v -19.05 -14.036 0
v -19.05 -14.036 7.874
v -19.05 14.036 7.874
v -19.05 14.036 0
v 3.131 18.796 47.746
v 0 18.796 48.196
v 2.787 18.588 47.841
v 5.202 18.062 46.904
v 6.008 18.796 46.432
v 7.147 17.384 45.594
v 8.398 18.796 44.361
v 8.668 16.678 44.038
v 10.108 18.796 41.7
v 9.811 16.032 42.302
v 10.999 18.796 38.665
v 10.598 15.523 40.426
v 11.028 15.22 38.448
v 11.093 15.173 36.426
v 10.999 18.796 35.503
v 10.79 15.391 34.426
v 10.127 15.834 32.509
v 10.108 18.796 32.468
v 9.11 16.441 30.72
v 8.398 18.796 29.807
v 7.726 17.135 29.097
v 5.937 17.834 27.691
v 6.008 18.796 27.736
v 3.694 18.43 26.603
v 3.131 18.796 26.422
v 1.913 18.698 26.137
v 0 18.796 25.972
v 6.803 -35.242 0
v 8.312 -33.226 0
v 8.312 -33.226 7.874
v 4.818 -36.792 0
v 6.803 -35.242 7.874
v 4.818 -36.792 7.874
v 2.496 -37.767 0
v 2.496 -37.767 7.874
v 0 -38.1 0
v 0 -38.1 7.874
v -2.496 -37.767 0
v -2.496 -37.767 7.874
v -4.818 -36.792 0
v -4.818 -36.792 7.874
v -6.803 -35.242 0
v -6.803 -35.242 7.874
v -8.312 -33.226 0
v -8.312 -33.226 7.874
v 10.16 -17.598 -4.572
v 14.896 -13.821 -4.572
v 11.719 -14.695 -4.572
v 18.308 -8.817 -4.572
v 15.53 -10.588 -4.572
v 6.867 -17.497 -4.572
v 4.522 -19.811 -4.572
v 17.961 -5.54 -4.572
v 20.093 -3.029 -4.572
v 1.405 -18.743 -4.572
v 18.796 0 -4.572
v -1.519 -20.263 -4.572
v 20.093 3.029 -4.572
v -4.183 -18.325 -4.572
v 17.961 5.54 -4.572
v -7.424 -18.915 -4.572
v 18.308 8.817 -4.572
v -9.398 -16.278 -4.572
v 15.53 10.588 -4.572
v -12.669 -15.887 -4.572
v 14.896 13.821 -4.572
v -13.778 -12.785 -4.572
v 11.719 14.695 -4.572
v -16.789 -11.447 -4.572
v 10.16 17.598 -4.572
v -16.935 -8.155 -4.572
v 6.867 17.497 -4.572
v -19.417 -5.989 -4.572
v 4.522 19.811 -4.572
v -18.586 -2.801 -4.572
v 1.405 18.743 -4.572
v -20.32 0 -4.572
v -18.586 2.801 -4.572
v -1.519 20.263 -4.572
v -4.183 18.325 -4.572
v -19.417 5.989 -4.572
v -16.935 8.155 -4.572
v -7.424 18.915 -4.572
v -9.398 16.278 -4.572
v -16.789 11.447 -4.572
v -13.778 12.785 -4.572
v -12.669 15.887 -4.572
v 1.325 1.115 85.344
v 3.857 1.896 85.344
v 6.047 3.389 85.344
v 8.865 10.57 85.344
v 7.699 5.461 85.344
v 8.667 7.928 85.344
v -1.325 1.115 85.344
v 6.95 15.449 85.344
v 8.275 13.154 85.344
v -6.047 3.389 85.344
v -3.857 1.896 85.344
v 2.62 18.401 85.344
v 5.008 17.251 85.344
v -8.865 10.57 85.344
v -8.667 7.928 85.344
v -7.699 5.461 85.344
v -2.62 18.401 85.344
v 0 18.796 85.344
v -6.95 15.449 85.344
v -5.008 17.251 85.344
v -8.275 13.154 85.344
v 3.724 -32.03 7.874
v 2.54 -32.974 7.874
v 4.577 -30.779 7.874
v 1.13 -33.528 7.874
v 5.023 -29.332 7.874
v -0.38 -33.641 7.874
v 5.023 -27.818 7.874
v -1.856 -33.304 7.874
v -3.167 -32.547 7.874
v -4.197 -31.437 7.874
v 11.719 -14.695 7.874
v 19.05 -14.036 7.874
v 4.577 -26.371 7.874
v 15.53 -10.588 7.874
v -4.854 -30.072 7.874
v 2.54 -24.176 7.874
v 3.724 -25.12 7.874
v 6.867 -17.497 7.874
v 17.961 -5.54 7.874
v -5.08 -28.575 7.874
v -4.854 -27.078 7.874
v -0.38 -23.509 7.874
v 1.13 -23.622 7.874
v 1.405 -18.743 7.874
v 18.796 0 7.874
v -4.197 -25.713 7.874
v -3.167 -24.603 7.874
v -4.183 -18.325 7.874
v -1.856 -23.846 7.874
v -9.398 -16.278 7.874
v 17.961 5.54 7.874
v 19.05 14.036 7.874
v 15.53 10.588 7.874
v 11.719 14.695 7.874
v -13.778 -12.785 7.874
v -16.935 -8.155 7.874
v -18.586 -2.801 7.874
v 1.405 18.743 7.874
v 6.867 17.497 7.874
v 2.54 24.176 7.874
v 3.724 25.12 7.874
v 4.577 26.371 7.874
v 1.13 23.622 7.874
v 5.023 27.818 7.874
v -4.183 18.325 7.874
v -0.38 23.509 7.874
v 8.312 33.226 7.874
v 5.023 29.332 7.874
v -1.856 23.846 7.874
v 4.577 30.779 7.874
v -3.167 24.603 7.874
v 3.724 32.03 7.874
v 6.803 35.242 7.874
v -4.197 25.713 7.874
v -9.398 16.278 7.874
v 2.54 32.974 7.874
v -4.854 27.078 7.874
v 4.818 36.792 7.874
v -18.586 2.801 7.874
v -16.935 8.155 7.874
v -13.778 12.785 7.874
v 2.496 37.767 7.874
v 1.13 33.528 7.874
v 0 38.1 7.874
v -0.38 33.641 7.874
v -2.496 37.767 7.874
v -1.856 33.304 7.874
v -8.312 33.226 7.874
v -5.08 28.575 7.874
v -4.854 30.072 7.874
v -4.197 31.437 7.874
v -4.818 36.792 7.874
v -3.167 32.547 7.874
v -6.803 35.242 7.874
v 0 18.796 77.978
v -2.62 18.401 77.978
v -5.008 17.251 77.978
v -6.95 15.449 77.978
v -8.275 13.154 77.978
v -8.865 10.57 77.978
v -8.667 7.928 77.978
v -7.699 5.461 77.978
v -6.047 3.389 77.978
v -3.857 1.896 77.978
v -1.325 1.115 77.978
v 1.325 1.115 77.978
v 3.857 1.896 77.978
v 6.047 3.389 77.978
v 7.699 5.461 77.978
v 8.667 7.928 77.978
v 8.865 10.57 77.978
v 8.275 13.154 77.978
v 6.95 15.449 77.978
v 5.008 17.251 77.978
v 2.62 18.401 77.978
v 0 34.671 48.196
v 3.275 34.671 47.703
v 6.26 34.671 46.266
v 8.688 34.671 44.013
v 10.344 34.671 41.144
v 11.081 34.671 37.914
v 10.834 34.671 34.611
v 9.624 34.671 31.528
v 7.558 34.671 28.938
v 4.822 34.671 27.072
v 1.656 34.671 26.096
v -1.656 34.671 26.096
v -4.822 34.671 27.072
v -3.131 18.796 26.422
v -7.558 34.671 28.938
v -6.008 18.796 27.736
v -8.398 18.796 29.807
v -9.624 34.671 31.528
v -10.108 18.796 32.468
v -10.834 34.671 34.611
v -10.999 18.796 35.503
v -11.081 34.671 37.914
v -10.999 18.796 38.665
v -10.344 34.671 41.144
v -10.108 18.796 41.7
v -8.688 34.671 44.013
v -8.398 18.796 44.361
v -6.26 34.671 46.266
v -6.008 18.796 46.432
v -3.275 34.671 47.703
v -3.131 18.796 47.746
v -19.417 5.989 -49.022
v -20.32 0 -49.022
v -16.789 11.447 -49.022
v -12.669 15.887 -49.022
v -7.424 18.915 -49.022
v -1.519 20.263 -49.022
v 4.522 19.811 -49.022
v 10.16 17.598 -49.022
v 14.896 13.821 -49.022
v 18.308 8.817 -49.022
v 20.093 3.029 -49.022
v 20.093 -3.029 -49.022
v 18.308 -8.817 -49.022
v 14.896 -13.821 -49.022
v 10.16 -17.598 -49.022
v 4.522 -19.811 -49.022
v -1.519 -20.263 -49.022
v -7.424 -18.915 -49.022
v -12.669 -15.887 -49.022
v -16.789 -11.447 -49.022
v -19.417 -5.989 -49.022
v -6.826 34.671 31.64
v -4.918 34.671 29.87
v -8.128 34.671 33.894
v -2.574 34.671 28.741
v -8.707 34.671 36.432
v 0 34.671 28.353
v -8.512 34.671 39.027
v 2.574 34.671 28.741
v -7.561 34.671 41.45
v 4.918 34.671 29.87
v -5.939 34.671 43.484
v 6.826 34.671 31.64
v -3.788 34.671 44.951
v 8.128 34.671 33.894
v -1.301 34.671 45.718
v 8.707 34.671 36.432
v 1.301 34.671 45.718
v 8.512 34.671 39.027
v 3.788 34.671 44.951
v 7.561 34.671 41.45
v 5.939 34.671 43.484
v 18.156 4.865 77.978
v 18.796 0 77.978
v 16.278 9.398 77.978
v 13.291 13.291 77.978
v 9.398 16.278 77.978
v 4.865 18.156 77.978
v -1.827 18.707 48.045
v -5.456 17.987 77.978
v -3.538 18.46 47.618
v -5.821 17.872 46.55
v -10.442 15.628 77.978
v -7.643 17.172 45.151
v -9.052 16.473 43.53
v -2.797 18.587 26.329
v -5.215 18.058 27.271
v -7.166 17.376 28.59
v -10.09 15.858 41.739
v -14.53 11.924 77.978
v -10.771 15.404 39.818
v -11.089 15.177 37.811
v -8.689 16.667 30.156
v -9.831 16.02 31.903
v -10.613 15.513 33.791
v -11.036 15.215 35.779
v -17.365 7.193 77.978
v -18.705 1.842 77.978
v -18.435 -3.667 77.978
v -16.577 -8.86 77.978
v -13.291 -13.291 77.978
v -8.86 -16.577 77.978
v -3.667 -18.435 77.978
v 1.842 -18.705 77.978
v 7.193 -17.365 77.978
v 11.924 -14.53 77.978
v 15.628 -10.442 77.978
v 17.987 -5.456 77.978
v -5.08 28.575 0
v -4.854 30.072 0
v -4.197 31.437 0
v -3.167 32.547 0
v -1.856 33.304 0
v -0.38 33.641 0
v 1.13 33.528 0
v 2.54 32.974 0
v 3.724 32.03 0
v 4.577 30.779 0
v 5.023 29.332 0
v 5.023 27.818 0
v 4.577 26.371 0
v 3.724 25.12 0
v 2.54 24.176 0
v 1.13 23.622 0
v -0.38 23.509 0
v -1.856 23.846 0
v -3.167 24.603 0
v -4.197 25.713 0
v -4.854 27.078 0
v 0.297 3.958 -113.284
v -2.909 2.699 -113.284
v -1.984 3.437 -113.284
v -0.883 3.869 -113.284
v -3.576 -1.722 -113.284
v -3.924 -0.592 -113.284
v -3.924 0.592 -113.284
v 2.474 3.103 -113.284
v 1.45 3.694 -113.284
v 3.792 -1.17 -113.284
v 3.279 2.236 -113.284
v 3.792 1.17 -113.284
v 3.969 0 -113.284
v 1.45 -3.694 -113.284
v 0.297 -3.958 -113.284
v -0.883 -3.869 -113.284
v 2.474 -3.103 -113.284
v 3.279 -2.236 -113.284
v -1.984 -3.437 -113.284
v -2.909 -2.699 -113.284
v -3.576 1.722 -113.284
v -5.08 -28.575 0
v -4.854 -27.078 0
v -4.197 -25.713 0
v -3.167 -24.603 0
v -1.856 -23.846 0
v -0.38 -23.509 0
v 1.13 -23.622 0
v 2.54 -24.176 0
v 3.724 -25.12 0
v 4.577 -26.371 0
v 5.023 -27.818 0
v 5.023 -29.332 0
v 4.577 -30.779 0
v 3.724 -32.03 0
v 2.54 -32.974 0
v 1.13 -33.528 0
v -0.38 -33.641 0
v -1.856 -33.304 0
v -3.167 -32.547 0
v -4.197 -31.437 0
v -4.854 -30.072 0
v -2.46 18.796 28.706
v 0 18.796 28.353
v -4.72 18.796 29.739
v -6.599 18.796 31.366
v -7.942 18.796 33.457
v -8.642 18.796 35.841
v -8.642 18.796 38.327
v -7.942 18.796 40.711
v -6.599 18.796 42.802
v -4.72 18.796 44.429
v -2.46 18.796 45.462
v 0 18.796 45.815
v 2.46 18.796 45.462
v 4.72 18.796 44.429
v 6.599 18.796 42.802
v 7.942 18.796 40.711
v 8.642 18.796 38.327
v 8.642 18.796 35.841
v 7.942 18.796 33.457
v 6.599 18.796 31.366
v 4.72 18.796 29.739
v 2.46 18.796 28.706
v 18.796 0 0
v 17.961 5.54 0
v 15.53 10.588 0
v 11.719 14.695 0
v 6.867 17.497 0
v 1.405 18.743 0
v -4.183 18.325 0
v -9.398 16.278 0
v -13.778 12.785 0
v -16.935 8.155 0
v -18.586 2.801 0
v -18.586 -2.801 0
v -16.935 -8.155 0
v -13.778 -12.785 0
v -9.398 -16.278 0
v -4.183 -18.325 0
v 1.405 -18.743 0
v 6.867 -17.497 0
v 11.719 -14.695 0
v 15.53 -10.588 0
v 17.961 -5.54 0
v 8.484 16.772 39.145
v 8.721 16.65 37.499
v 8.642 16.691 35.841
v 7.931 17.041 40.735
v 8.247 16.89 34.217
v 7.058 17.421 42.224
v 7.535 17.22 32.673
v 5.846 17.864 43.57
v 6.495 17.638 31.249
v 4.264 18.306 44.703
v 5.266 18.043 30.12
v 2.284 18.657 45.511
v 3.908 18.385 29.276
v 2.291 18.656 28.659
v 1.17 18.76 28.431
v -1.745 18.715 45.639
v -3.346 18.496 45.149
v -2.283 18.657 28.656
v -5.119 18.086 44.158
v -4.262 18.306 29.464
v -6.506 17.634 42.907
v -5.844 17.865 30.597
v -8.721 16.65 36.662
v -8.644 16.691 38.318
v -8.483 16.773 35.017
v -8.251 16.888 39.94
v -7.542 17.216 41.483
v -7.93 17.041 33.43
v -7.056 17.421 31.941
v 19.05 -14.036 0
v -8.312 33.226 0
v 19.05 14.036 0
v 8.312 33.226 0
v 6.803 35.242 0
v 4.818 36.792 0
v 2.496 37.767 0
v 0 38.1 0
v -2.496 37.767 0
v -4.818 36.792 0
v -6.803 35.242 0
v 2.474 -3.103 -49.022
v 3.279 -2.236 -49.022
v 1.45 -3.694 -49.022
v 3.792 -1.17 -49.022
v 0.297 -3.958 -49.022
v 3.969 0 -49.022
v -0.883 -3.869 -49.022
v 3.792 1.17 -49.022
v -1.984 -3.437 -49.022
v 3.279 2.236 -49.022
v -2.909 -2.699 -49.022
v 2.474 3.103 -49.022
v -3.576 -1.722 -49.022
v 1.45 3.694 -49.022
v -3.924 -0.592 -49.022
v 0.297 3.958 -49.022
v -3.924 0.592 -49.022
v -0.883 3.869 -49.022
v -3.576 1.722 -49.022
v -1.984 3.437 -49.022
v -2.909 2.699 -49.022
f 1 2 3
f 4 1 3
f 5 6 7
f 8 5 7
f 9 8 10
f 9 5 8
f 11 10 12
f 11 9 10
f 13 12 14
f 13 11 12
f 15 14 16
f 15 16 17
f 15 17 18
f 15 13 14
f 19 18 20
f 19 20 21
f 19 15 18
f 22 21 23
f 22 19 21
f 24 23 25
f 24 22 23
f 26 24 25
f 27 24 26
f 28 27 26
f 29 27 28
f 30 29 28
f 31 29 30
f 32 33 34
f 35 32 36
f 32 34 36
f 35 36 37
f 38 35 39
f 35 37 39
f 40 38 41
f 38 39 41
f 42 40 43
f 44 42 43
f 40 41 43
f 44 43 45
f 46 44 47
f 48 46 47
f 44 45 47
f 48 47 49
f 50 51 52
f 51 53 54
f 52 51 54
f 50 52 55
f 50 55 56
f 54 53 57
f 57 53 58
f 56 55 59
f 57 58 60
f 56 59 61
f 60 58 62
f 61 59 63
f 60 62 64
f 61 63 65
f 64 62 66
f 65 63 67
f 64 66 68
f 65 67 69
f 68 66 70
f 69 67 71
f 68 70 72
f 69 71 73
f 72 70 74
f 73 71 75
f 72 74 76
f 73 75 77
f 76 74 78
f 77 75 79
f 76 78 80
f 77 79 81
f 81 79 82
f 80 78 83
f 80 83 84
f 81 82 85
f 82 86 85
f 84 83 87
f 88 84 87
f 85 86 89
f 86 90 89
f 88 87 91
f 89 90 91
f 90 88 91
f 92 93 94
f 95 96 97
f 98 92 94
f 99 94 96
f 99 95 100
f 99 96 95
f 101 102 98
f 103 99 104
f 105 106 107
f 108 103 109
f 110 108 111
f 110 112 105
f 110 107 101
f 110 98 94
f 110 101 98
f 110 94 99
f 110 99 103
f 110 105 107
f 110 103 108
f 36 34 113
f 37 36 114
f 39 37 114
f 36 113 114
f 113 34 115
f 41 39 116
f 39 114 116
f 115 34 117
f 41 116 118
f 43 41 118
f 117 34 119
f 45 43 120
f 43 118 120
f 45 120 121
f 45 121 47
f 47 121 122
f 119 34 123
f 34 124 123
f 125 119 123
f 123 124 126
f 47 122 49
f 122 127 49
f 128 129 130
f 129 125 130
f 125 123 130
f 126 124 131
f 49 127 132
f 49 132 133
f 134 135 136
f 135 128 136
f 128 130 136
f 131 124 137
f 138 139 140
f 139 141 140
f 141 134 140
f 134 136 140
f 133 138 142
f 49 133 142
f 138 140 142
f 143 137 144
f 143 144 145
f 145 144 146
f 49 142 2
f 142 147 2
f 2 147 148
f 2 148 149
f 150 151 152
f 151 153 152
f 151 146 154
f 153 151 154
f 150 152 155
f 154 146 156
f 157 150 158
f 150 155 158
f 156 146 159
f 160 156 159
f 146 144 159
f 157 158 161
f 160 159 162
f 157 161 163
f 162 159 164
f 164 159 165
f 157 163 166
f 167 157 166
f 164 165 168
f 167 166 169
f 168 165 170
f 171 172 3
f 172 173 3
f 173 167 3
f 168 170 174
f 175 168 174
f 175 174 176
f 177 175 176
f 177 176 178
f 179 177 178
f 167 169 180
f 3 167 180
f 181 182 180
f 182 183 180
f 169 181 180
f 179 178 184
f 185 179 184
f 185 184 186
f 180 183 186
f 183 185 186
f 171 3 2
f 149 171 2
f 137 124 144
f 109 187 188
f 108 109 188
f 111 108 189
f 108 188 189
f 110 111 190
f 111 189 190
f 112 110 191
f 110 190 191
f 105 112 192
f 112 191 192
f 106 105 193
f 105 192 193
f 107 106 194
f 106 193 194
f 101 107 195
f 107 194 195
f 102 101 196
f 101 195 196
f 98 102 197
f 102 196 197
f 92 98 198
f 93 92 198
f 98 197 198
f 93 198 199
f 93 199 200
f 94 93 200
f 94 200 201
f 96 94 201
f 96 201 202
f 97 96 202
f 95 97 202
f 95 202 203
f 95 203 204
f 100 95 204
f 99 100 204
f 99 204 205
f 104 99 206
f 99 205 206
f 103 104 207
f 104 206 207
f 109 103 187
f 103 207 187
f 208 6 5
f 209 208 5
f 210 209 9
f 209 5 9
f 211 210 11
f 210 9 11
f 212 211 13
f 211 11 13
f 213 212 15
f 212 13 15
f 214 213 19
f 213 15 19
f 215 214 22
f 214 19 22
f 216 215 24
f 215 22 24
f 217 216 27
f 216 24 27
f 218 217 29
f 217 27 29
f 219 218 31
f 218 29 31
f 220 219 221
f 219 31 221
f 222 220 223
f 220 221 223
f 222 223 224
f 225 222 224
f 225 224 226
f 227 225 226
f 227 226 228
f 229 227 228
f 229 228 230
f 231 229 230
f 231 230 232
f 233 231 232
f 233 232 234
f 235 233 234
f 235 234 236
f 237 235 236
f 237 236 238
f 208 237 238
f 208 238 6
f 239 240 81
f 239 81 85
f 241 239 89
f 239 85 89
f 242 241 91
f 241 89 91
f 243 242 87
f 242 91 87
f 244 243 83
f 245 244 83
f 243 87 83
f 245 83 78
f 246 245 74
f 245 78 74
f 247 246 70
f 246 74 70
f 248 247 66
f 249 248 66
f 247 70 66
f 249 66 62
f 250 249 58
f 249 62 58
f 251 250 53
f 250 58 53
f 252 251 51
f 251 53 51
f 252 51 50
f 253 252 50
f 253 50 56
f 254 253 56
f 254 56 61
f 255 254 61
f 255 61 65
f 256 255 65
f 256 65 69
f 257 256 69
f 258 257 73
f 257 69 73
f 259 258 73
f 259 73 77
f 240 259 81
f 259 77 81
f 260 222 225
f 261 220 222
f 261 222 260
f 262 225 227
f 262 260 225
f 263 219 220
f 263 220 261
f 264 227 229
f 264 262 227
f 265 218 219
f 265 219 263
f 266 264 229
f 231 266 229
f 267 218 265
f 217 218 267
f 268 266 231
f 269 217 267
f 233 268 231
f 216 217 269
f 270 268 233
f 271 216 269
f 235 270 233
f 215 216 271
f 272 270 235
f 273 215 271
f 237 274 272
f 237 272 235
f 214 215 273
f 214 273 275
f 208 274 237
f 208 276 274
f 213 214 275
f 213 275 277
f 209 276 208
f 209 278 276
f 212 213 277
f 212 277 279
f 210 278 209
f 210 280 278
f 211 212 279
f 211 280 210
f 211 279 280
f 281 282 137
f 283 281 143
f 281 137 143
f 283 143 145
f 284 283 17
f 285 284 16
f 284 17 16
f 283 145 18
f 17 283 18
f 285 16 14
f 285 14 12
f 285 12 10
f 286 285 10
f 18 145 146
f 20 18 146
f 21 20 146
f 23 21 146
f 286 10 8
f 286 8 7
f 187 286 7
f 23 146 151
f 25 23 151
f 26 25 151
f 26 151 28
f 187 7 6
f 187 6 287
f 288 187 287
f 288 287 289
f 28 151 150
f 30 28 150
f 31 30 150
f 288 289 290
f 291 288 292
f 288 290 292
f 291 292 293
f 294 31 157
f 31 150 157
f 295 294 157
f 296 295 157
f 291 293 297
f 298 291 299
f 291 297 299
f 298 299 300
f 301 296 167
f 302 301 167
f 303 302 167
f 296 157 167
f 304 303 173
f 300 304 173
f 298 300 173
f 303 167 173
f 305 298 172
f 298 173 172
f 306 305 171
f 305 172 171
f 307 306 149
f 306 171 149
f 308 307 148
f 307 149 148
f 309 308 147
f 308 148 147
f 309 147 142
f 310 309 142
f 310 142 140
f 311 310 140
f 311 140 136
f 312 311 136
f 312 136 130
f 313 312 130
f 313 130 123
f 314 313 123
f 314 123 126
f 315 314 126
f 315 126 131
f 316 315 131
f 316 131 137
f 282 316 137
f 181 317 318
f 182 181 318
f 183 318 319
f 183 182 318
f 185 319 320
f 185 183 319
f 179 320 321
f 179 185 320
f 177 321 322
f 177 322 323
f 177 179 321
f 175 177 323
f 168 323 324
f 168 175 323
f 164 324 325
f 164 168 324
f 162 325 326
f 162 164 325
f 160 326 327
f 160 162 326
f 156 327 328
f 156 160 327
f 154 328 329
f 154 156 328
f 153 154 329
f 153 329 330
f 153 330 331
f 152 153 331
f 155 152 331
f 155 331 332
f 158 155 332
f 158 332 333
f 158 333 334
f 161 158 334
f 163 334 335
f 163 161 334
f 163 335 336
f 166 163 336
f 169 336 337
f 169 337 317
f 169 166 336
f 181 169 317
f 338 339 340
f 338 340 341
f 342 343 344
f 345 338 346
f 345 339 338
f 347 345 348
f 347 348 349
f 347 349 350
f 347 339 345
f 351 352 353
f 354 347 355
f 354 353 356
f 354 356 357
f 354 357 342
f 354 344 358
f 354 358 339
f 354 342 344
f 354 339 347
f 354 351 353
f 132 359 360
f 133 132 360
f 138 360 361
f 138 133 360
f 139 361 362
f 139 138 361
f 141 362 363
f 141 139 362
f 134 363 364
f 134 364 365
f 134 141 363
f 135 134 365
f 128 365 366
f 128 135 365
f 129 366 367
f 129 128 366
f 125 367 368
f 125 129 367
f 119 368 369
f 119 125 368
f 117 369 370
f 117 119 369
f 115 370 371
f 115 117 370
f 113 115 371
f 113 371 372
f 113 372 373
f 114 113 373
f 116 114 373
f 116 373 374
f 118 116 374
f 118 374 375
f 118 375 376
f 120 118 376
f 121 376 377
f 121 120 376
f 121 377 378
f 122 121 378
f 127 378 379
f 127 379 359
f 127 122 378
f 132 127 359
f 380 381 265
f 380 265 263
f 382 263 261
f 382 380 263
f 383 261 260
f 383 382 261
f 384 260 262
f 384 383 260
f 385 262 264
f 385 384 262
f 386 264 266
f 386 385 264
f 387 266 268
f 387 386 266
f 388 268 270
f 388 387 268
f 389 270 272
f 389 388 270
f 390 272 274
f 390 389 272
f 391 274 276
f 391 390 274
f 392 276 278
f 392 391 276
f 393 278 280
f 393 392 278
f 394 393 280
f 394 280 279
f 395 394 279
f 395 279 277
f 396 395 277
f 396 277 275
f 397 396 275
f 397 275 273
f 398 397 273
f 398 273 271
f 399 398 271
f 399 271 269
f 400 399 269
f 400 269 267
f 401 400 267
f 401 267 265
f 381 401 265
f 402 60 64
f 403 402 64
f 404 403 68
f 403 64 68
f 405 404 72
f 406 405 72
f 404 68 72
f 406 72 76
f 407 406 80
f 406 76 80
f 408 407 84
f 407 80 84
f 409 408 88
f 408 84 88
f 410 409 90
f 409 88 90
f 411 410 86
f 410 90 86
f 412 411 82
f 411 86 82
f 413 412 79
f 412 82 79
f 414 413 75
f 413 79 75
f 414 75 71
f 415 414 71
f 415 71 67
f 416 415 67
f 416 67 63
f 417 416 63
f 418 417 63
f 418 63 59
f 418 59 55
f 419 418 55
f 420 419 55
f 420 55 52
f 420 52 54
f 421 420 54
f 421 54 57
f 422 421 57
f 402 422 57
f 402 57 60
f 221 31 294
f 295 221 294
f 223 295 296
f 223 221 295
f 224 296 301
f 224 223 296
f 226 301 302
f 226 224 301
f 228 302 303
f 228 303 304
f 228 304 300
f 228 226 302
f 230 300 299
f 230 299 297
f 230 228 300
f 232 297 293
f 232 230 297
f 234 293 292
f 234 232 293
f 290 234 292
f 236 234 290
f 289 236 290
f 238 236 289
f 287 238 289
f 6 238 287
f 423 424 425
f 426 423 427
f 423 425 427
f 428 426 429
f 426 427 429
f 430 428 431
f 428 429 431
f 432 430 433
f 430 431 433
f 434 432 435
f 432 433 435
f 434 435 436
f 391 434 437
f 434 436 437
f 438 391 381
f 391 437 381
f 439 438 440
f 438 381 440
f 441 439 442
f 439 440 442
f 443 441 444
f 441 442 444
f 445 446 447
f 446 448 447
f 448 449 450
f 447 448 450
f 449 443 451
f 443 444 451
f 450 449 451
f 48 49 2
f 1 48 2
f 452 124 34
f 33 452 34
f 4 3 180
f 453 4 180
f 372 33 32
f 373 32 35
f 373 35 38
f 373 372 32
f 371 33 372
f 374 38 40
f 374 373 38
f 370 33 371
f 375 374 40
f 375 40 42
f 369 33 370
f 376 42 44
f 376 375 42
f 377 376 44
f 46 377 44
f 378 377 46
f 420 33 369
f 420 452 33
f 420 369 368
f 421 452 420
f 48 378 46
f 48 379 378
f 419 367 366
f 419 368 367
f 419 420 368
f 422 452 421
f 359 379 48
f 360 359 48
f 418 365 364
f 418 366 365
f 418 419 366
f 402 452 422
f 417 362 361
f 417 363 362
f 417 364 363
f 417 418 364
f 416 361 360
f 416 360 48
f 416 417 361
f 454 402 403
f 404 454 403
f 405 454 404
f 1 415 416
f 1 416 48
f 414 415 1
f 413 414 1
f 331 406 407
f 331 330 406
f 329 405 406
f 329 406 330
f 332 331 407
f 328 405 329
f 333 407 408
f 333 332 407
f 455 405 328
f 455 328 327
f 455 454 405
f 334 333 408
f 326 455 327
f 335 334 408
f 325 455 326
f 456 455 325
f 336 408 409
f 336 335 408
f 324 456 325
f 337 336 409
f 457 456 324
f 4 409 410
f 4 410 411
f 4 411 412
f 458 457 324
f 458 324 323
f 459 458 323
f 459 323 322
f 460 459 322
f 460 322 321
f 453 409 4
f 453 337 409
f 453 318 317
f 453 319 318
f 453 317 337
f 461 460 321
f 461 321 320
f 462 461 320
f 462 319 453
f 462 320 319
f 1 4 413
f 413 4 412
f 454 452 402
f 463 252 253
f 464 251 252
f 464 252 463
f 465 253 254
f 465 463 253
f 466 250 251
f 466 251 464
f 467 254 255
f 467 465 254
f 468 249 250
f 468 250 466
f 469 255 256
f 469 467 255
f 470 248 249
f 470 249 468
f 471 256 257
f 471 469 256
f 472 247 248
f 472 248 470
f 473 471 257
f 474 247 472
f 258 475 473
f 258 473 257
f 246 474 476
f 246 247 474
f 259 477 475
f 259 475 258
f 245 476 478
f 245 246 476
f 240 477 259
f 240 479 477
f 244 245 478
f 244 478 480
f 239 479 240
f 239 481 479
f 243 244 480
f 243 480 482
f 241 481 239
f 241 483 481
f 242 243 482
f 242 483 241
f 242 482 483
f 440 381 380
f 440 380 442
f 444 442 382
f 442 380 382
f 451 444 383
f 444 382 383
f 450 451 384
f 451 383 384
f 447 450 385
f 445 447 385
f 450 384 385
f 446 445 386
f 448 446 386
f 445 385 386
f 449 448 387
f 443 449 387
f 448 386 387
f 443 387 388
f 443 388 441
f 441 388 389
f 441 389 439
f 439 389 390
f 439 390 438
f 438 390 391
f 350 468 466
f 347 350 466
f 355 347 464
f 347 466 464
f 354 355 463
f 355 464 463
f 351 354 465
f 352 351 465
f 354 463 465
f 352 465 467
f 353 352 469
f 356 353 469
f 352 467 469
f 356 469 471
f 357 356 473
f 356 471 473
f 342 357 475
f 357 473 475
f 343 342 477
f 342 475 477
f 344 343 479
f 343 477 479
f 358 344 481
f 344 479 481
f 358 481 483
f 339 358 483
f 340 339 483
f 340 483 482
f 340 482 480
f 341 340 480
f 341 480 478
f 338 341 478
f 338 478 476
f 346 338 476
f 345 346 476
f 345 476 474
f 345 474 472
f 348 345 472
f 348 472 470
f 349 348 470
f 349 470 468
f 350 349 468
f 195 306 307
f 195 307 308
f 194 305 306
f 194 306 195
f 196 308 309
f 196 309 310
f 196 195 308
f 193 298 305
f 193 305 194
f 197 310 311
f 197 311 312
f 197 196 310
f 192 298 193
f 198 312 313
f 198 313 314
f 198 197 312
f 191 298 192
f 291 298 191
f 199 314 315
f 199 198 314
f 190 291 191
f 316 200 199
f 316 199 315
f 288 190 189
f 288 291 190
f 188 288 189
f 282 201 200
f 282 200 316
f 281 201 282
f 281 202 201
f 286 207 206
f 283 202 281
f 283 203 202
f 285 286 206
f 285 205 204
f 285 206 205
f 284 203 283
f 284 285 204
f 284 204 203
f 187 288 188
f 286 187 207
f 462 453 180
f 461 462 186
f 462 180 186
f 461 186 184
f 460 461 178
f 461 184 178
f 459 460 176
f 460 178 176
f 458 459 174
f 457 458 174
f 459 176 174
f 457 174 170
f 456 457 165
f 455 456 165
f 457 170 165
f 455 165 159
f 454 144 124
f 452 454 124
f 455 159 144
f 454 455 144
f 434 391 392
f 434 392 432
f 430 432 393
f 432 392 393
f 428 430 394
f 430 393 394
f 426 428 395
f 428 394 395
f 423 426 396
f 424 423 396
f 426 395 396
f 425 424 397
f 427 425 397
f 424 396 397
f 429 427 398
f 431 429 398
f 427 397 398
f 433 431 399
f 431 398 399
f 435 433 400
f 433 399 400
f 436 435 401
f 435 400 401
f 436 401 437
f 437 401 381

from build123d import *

# Parameters (mm, degrees)
MASTER_CYLINDER_BODY_DEPTH             = 77.978
MASTER_CYLINDER_BODY_DEPTH_BACK        = 4.572
SKETCH1_R                              = 18.796
MASTER_START                           = -7.874
MASTER_CYLINDER_MOUNTS_OUTLINE_R       = 5.08
MASTER_CYLINDER_MOUNTS_OUTLINE_R_2     = 18.796
MASTER_CYLINDER_MOUNTS_DEPTH           = 7.874
SKETCH3_R                              = 11.1125
SKETCH3_R_2                            = 8.73125
RESERVOIR_MOUNT_DEPTH                  = 15.875
RESERVOIR_MOUNT_DIRECTION_2_REACH      = 100.39
RESERVOIR_MOUNT_DIRECTION_2_END_RADIUS = 18.796
SKETCH5_R                              = 8.89
MASTER_CYLINDER_OUTLET_DEPTH           = 7.366
SKETCH6_R                              = 3.96875
PUSHROD_DEPTH                          = 108.712
SKETCH7_R                              = 20.32
RUBBER_COVER_DEPTH                     = 44.45


# Read off the part's stored shape, not the designer's step: Master Cylinder Mounts
with BuildPart() as part:
    # Sketch1 → Master Cylinder Body (new, two sides: drawn at the far end of the back side and taken through both)
    with BuildSketch(Plane.XY.offset(-MASTER_CYLINDER_BODY_DEPTH_BACK)):
        Circle(SKETCH1_R)
    extrude(amount=MASTER_CYLINDER_BODY_DEPTH + MASTER_CYLINDER_BODY_DEPTH_BACK)

    # Master Cylinder Mounts outline → Master Cylinder Mounts (add)
    with BuildSketch(Plane(origin=(0, 0, 0), x_dir=(-1, 0, 0), z_dir=(0, 0, -1)).offset(MASTER_START)):
        with BuildLine():
            ThreePointArc((-8.312226974, -33.226075976), (0, -38.1), (8.312226974, -33.226075976))
            Line((8.312226974, -33.226075976), (19.05, -14.035934373))
            Line((19.05, -14.035934373), (19.05, 14.035934373))
            Line((19.05, 14.035934373), (8.312226974, 33.226075976))
            ThreePointArc((8.312226974, 33.226075976), (0, 38.1), (-8.312226974, 33.226075976))
            Line((-8.312226974, 33.226075976), (-19.05, 14.035934373))
            Line((-19.05, 14.035934373), (-19.05, -14.035934373))
            Line((-19.05, -14.035934373), (-8.312226974, -33.226075976))
        make_face()
        with Locations((0, -28.575)):
            Circle(MASTER_CYLINDER_MOUNTS_OUTLINE_R, mode=Mode.SUBTRACT)
        Circle(MASTER_CYLINDER_MOUNTS_OUTLINE_R_2, mode=Mode.SUBTRACT)
        with Locations((0, 28.575)):
            Circle(MASTER_CYLINDER_MOUNTS_OUTLINE_R, mode=Mode.SUBTRACT)
    extrude(amount=MASTER_CYLINDER_MOUNTS_DEPTH)

    # Sketch3 → Reservoir Mount (add)
    with BuildSketch(Plane(origin=(0, 18.796, 0), x_dir=(1, 0, 0), z_dir=(0, 1, 0))):
        with Locations(Location((0, -37.084, 0), (0, 0, 270))):
            Circle(SKETCH3_R)
        with Locations(Location((0, -37.084, 0), (0, 0, 90))):
            Circle(SKETCH3_R_2, mode=Mode.SUBTRACT)
    extrude(amount=RESERVOIR_MOUNT_DEPTH)

    # Reservoir Mount direction 2: up to this cylinder (the profile starts outside it)
    reservoir_mount_direction_2_end = Plane(origin=(0, 0, 26.285809), z_dir=(0, 0, 1)) * Cylinder(RESERVOIR_MOUNT_DIRECTION_2_END_RADIUS, 239.372, mode=Mode.PRIVATE)
    # Sketch3 → Reservoir Mount direction 2 (add, up to the surface)
    with BuildSketch(Plane(origin=(0, 18.796, 0), x_dir=(1, 0, 0), z_dir=(0, 1, 0)), mode=Mode.PRIVATE) as reservoir_mount_direction_2_sk1:
        with Locations(Location((0, -37.084, 0), (0, 0, 270))):
            Circle(SKETCH3_R)
        with Locations(Location((0, -37.084, 0), (0, 0, 90))):
            Circle(SKETCH3_R_2, mode=Mode.SUBTRACT)
    reservoir_mount_direction_2_tool1 = extrude(reservoir_mount_direction_2_sk1.sketch, amount=-RESERVOIR_MOUNT_DIRECTION_2_REACH, mode=Mode.PRIVATE) - reservoir_mount_direction_2_end
    add(reservoir_mount_direction_2_tool1.solids().sort_by_distance((0, 18.796, 26.285809))[0])
    add(reservoir_mount_direction_2_tool1.solids().sort_by_distance((0, 18.796, 26.285809))[1])

    # Sketch5 → Master Cylinder Outlet (add)
    with BuildSketch(Plane.XY.offset(77.978)):
        with Locations(Location((0, 9.906, 0), (0, 0, 90))):
            Circle(SKETCH5_R)
    extrude(amount=MASTER_CYLINDER_OUTLET_DEPTH)

    # Sketch6 → Pushrod (add)
    with BuildSketch(Plane(origin=(0, 0, -4.572), x_dir=(-1, 0, 0), z_dir=(0, 0, -1))):
        with Locations(Location((0, 0, 0), (0, 0, 180))):
            Circle(SKETCH6_R)
    extrude(amount=PUSHROD_DEPTH)

    # Sketch7 → Rubber Cover (add)
    with BuildSketch(Plane(origin=(0, 0, -4.572), x_dir=(-1, 0, 0), z_dir=(0, 0, -1))):
        Circle(SKETCH7_R)
    extrude(amount=RUBBER_COVER_DEPTH)


solid = part.part
